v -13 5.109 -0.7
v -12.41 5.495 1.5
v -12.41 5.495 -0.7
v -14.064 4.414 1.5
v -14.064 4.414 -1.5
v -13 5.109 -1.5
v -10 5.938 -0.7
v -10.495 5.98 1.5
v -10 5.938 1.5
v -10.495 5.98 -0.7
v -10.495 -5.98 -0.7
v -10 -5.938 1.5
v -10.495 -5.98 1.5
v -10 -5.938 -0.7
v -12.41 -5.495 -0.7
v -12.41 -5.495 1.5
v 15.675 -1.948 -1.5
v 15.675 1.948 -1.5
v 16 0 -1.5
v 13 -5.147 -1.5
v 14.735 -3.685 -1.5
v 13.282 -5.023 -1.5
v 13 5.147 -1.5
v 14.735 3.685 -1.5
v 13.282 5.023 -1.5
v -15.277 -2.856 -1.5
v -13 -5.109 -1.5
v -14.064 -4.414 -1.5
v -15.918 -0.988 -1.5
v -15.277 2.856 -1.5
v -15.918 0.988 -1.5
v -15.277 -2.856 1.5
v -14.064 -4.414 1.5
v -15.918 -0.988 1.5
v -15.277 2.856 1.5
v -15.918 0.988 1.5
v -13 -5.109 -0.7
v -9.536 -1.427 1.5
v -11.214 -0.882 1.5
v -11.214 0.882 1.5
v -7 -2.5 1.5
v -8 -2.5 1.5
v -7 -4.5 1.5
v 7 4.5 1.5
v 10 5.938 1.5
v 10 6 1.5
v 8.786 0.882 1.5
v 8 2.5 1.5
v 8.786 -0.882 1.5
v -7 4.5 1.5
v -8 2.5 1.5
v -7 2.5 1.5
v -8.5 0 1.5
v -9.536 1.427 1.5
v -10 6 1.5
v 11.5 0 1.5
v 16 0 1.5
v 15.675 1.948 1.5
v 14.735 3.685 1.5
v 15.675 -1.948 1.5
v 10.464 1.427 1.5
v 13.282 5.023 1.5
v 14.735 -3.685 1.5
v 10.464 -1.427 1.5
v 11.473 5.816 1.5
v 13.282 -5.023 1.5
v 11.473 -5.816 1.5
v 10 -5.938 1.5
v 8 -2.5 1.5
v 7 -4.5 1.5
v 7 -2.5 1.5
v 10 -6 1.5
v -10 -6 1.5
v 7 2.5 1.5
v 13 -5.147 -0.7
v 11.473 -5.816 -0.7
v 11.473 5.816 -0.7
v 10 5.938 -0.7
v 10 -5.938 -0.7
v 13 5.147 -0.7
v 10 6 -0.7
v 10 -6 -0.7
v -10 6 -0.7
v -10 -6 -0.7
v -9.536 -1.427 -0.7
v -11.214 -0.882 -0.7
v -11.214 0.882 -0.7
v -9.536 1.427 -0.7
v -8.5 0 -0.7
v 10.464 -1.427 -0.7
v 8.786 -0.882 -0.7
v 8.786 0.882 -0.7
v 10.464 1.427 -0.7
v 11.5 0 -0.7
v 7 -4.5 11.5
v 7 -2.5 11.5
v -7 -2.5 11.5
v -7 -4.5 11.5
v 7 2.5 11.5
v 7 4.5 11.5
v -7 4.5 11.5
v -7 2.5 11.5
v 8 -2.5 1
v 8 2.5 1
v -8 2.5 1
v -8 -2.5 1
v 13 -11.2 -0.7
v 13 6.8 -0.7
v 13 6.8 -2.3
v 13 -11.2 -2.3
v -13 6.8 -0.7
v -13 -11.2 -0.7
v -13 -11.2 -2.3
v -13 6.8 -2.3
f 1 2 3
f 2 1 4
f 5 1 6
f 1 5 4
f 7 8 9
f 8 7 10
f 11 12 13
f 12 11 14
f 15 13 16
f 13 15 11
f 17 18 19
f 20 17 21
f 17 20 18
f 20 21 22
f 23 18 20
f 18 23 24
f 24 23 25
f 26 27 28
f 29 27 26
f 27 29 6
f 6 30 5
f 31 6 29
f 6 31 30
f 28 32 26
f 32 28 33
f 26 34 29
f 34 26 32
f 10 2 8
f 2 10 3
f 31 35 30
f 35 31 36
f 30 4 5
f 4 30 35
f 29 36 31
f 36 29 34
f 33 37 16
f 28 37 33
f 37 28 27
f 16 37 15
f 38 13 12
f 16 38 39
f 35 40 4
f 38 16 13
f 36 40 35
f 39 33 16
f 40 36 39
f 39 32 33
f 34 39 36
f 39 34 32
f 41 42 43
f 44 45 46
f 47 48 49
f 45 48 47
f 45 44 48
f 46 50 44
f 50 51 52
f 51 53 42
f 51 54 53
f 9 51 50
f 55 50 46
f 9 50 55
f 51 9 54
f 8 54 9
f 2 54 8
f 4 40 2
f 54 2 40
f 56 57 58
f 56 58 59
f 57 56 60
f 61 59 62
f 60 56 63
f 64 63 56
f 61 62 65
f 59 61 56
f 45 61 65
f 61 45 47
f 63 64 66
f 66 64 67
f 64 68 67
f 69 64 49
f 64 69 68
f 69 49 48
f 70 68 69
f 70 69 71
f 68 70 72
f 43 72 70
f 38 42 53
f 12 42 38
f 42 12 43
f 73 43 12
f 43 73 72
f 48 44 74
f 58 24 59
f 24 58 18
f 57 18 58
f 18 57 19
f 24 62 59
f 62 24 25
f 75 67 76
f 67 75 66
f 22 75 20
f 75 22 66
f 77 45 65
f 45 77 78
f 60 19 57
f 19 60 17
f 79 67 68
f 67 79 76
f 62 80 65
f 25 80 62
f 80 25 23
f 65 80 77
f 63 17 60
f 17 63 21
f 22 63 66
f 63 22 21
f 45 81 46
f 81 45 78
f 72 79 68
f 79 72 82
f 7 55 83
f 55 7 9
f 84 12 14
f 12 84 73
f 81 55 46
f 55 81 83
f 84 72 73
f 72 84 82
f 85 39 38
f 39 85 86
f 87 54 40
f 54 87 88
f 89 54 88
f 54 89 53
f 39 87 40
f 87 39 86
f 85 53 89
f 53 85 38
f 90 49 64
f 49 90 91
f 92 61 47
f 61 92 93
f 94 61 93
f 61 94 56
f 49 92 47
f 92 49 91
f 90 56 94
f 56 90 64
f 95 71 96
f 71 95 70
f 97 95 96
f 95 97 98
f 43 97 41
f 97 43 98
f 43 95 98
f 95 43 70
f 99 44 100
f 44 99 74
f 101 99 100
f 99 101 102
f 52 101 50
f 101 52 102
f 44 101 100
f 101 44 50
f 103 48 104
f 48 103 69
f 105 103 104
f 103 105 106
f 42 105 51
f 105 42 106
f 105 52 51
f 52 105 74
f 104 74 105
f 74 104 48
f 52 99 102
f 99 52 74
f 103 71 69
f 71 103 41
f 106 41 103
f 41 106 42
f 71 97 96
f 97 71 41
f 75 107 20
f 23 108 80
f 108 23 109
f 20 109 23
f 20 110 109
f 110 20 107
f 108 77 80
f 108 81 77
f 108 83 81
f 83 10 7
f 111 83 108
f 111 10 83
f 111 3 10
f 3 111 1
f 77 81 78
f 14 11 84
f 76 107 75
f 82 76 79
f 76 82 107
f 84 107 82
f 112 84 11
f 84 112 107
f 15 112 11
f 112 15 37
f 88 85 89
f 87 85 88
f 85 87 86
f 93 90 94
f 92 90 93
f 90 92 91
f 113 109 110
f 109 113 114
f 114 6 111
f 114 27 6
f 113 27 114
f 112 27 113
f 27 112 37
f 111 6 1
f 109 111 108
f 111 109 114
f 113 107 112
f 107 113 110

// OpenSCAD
// Parameters
type = 0; //[0:3:1]
base_width = 12; //[6:24:1]
base_height = 3; //[1.5:6:0.5]
hole_diameter = 3; //[1.5:6:0.5]
hole_spacing = 20; //[10:40:1]
gap_width = 5; //[2.5:10:0.5]
gap_height = 10; //[5:20:1]
stem_width = 3; //[1.5:6:0.5]
stem_depth_x = 14; //[7:28:1]
overlap = 1; //[0.5:2:0.5]
pcb_thickness = 1.6; //[0.8:3.2:0.1]
pcb_width_x = 26; //[13:52:1]
pcb_depth_y = 18; //[9:36:1]
pcb_offset_y = 10; //[5:20:1]
pcb_overlap_into_base = 0.8; //[0.4:1.6:0.1]

// Photo Interrupter - complete geometry (now a single connected solid)
module photo_interrupter() {

  // Derived placement so PCB is physically attached to the base with overlap
  // Base is centered at z=0 with thickness base_height.
  // Place PCB so its top face penetrates into the base by pcb_overlap_into_base.
  pcb_z = -(base_height/2 + pcb_thickness/2 - pcb_overlap_into_base);

  // Place PCB in Y so its top edge penetrates into the base footprint by pcb_overlap_into_base.
  // Base spans y = [-base_width/2, +base_width/2].
  // PCB spans y = [pcb_y - pcb_depth_y/2, pcb_y + pcb_depth_y/2].
  // Enforce: pcb_y + pcb_depth_y/2 = base_width/2 + pcb_overlap_into_base
  pcb_y = (base_width/2 + pcb_overlap_into_base) - pcb_depth_y/2;

  union() {

    // Dark blue interrupter body (base + stems) with U-slot cutout
    color([0.15, 0.2, 0.35])
    difference() {
      union() {
        // Mounting base (capsule)
        difference() {
          union() {
            translate([-hole_spacing/2, 0, 0])
              cylinder(r=base_width/2, h=base_height, center=true);
            translate([ hole_spacing/2, 0, 0])
              cylinder(r=base_width/2, h=base_height, center=true);
            translate([0, 0, 0])
              cube([hole_spacing, base_width, base_height], center=true);
          }
          union() {
            translate([-hole_spacing/2, 0, 0])
              cylinder(r=hole_diameter/2, h=base_height + 2*overlap, center=true);
            translate([ hole_spacing/2, 0, 0])
              cylinder(r=hole_diameter/2, h=base_height + 2*overlap, center=true);
          }
        }

        // Sensor stems (attached to base; overlap already built into y placement)
        translate([0, -(gap_width/2 + stem_width/2 - overlap), gap_height/2])
          cube([stem_depth_x, stem_width, gap_height + base_height], center=true);
        translate([0,  (gap_width/2 + stem_width/2 - overlap), gap_height/2])
          cube([stem_depth_x, stem_width, gap_height + base_height], center=true);
      }

      // U-slot gap (cutout)
      translate([0, 0, base_height/2 + gap_height/2])
        cube([stem_depth_x + 2*overlap, gap_width, gap_height + overlap], center=true);
    }

    // Green PCB (now physically attached to the base with overlap in Y and Z)
    color([0.0, 0.4, 0.2])
      translate([0, pcb_y, pcb_z])
        cube([pcb_width_x, pcb_depth_y, pcb_thickness], center=true);
  }
}

// Assembly
module assembly() {
  union() {
    photo_interrupter();
  }
}

assembly();
